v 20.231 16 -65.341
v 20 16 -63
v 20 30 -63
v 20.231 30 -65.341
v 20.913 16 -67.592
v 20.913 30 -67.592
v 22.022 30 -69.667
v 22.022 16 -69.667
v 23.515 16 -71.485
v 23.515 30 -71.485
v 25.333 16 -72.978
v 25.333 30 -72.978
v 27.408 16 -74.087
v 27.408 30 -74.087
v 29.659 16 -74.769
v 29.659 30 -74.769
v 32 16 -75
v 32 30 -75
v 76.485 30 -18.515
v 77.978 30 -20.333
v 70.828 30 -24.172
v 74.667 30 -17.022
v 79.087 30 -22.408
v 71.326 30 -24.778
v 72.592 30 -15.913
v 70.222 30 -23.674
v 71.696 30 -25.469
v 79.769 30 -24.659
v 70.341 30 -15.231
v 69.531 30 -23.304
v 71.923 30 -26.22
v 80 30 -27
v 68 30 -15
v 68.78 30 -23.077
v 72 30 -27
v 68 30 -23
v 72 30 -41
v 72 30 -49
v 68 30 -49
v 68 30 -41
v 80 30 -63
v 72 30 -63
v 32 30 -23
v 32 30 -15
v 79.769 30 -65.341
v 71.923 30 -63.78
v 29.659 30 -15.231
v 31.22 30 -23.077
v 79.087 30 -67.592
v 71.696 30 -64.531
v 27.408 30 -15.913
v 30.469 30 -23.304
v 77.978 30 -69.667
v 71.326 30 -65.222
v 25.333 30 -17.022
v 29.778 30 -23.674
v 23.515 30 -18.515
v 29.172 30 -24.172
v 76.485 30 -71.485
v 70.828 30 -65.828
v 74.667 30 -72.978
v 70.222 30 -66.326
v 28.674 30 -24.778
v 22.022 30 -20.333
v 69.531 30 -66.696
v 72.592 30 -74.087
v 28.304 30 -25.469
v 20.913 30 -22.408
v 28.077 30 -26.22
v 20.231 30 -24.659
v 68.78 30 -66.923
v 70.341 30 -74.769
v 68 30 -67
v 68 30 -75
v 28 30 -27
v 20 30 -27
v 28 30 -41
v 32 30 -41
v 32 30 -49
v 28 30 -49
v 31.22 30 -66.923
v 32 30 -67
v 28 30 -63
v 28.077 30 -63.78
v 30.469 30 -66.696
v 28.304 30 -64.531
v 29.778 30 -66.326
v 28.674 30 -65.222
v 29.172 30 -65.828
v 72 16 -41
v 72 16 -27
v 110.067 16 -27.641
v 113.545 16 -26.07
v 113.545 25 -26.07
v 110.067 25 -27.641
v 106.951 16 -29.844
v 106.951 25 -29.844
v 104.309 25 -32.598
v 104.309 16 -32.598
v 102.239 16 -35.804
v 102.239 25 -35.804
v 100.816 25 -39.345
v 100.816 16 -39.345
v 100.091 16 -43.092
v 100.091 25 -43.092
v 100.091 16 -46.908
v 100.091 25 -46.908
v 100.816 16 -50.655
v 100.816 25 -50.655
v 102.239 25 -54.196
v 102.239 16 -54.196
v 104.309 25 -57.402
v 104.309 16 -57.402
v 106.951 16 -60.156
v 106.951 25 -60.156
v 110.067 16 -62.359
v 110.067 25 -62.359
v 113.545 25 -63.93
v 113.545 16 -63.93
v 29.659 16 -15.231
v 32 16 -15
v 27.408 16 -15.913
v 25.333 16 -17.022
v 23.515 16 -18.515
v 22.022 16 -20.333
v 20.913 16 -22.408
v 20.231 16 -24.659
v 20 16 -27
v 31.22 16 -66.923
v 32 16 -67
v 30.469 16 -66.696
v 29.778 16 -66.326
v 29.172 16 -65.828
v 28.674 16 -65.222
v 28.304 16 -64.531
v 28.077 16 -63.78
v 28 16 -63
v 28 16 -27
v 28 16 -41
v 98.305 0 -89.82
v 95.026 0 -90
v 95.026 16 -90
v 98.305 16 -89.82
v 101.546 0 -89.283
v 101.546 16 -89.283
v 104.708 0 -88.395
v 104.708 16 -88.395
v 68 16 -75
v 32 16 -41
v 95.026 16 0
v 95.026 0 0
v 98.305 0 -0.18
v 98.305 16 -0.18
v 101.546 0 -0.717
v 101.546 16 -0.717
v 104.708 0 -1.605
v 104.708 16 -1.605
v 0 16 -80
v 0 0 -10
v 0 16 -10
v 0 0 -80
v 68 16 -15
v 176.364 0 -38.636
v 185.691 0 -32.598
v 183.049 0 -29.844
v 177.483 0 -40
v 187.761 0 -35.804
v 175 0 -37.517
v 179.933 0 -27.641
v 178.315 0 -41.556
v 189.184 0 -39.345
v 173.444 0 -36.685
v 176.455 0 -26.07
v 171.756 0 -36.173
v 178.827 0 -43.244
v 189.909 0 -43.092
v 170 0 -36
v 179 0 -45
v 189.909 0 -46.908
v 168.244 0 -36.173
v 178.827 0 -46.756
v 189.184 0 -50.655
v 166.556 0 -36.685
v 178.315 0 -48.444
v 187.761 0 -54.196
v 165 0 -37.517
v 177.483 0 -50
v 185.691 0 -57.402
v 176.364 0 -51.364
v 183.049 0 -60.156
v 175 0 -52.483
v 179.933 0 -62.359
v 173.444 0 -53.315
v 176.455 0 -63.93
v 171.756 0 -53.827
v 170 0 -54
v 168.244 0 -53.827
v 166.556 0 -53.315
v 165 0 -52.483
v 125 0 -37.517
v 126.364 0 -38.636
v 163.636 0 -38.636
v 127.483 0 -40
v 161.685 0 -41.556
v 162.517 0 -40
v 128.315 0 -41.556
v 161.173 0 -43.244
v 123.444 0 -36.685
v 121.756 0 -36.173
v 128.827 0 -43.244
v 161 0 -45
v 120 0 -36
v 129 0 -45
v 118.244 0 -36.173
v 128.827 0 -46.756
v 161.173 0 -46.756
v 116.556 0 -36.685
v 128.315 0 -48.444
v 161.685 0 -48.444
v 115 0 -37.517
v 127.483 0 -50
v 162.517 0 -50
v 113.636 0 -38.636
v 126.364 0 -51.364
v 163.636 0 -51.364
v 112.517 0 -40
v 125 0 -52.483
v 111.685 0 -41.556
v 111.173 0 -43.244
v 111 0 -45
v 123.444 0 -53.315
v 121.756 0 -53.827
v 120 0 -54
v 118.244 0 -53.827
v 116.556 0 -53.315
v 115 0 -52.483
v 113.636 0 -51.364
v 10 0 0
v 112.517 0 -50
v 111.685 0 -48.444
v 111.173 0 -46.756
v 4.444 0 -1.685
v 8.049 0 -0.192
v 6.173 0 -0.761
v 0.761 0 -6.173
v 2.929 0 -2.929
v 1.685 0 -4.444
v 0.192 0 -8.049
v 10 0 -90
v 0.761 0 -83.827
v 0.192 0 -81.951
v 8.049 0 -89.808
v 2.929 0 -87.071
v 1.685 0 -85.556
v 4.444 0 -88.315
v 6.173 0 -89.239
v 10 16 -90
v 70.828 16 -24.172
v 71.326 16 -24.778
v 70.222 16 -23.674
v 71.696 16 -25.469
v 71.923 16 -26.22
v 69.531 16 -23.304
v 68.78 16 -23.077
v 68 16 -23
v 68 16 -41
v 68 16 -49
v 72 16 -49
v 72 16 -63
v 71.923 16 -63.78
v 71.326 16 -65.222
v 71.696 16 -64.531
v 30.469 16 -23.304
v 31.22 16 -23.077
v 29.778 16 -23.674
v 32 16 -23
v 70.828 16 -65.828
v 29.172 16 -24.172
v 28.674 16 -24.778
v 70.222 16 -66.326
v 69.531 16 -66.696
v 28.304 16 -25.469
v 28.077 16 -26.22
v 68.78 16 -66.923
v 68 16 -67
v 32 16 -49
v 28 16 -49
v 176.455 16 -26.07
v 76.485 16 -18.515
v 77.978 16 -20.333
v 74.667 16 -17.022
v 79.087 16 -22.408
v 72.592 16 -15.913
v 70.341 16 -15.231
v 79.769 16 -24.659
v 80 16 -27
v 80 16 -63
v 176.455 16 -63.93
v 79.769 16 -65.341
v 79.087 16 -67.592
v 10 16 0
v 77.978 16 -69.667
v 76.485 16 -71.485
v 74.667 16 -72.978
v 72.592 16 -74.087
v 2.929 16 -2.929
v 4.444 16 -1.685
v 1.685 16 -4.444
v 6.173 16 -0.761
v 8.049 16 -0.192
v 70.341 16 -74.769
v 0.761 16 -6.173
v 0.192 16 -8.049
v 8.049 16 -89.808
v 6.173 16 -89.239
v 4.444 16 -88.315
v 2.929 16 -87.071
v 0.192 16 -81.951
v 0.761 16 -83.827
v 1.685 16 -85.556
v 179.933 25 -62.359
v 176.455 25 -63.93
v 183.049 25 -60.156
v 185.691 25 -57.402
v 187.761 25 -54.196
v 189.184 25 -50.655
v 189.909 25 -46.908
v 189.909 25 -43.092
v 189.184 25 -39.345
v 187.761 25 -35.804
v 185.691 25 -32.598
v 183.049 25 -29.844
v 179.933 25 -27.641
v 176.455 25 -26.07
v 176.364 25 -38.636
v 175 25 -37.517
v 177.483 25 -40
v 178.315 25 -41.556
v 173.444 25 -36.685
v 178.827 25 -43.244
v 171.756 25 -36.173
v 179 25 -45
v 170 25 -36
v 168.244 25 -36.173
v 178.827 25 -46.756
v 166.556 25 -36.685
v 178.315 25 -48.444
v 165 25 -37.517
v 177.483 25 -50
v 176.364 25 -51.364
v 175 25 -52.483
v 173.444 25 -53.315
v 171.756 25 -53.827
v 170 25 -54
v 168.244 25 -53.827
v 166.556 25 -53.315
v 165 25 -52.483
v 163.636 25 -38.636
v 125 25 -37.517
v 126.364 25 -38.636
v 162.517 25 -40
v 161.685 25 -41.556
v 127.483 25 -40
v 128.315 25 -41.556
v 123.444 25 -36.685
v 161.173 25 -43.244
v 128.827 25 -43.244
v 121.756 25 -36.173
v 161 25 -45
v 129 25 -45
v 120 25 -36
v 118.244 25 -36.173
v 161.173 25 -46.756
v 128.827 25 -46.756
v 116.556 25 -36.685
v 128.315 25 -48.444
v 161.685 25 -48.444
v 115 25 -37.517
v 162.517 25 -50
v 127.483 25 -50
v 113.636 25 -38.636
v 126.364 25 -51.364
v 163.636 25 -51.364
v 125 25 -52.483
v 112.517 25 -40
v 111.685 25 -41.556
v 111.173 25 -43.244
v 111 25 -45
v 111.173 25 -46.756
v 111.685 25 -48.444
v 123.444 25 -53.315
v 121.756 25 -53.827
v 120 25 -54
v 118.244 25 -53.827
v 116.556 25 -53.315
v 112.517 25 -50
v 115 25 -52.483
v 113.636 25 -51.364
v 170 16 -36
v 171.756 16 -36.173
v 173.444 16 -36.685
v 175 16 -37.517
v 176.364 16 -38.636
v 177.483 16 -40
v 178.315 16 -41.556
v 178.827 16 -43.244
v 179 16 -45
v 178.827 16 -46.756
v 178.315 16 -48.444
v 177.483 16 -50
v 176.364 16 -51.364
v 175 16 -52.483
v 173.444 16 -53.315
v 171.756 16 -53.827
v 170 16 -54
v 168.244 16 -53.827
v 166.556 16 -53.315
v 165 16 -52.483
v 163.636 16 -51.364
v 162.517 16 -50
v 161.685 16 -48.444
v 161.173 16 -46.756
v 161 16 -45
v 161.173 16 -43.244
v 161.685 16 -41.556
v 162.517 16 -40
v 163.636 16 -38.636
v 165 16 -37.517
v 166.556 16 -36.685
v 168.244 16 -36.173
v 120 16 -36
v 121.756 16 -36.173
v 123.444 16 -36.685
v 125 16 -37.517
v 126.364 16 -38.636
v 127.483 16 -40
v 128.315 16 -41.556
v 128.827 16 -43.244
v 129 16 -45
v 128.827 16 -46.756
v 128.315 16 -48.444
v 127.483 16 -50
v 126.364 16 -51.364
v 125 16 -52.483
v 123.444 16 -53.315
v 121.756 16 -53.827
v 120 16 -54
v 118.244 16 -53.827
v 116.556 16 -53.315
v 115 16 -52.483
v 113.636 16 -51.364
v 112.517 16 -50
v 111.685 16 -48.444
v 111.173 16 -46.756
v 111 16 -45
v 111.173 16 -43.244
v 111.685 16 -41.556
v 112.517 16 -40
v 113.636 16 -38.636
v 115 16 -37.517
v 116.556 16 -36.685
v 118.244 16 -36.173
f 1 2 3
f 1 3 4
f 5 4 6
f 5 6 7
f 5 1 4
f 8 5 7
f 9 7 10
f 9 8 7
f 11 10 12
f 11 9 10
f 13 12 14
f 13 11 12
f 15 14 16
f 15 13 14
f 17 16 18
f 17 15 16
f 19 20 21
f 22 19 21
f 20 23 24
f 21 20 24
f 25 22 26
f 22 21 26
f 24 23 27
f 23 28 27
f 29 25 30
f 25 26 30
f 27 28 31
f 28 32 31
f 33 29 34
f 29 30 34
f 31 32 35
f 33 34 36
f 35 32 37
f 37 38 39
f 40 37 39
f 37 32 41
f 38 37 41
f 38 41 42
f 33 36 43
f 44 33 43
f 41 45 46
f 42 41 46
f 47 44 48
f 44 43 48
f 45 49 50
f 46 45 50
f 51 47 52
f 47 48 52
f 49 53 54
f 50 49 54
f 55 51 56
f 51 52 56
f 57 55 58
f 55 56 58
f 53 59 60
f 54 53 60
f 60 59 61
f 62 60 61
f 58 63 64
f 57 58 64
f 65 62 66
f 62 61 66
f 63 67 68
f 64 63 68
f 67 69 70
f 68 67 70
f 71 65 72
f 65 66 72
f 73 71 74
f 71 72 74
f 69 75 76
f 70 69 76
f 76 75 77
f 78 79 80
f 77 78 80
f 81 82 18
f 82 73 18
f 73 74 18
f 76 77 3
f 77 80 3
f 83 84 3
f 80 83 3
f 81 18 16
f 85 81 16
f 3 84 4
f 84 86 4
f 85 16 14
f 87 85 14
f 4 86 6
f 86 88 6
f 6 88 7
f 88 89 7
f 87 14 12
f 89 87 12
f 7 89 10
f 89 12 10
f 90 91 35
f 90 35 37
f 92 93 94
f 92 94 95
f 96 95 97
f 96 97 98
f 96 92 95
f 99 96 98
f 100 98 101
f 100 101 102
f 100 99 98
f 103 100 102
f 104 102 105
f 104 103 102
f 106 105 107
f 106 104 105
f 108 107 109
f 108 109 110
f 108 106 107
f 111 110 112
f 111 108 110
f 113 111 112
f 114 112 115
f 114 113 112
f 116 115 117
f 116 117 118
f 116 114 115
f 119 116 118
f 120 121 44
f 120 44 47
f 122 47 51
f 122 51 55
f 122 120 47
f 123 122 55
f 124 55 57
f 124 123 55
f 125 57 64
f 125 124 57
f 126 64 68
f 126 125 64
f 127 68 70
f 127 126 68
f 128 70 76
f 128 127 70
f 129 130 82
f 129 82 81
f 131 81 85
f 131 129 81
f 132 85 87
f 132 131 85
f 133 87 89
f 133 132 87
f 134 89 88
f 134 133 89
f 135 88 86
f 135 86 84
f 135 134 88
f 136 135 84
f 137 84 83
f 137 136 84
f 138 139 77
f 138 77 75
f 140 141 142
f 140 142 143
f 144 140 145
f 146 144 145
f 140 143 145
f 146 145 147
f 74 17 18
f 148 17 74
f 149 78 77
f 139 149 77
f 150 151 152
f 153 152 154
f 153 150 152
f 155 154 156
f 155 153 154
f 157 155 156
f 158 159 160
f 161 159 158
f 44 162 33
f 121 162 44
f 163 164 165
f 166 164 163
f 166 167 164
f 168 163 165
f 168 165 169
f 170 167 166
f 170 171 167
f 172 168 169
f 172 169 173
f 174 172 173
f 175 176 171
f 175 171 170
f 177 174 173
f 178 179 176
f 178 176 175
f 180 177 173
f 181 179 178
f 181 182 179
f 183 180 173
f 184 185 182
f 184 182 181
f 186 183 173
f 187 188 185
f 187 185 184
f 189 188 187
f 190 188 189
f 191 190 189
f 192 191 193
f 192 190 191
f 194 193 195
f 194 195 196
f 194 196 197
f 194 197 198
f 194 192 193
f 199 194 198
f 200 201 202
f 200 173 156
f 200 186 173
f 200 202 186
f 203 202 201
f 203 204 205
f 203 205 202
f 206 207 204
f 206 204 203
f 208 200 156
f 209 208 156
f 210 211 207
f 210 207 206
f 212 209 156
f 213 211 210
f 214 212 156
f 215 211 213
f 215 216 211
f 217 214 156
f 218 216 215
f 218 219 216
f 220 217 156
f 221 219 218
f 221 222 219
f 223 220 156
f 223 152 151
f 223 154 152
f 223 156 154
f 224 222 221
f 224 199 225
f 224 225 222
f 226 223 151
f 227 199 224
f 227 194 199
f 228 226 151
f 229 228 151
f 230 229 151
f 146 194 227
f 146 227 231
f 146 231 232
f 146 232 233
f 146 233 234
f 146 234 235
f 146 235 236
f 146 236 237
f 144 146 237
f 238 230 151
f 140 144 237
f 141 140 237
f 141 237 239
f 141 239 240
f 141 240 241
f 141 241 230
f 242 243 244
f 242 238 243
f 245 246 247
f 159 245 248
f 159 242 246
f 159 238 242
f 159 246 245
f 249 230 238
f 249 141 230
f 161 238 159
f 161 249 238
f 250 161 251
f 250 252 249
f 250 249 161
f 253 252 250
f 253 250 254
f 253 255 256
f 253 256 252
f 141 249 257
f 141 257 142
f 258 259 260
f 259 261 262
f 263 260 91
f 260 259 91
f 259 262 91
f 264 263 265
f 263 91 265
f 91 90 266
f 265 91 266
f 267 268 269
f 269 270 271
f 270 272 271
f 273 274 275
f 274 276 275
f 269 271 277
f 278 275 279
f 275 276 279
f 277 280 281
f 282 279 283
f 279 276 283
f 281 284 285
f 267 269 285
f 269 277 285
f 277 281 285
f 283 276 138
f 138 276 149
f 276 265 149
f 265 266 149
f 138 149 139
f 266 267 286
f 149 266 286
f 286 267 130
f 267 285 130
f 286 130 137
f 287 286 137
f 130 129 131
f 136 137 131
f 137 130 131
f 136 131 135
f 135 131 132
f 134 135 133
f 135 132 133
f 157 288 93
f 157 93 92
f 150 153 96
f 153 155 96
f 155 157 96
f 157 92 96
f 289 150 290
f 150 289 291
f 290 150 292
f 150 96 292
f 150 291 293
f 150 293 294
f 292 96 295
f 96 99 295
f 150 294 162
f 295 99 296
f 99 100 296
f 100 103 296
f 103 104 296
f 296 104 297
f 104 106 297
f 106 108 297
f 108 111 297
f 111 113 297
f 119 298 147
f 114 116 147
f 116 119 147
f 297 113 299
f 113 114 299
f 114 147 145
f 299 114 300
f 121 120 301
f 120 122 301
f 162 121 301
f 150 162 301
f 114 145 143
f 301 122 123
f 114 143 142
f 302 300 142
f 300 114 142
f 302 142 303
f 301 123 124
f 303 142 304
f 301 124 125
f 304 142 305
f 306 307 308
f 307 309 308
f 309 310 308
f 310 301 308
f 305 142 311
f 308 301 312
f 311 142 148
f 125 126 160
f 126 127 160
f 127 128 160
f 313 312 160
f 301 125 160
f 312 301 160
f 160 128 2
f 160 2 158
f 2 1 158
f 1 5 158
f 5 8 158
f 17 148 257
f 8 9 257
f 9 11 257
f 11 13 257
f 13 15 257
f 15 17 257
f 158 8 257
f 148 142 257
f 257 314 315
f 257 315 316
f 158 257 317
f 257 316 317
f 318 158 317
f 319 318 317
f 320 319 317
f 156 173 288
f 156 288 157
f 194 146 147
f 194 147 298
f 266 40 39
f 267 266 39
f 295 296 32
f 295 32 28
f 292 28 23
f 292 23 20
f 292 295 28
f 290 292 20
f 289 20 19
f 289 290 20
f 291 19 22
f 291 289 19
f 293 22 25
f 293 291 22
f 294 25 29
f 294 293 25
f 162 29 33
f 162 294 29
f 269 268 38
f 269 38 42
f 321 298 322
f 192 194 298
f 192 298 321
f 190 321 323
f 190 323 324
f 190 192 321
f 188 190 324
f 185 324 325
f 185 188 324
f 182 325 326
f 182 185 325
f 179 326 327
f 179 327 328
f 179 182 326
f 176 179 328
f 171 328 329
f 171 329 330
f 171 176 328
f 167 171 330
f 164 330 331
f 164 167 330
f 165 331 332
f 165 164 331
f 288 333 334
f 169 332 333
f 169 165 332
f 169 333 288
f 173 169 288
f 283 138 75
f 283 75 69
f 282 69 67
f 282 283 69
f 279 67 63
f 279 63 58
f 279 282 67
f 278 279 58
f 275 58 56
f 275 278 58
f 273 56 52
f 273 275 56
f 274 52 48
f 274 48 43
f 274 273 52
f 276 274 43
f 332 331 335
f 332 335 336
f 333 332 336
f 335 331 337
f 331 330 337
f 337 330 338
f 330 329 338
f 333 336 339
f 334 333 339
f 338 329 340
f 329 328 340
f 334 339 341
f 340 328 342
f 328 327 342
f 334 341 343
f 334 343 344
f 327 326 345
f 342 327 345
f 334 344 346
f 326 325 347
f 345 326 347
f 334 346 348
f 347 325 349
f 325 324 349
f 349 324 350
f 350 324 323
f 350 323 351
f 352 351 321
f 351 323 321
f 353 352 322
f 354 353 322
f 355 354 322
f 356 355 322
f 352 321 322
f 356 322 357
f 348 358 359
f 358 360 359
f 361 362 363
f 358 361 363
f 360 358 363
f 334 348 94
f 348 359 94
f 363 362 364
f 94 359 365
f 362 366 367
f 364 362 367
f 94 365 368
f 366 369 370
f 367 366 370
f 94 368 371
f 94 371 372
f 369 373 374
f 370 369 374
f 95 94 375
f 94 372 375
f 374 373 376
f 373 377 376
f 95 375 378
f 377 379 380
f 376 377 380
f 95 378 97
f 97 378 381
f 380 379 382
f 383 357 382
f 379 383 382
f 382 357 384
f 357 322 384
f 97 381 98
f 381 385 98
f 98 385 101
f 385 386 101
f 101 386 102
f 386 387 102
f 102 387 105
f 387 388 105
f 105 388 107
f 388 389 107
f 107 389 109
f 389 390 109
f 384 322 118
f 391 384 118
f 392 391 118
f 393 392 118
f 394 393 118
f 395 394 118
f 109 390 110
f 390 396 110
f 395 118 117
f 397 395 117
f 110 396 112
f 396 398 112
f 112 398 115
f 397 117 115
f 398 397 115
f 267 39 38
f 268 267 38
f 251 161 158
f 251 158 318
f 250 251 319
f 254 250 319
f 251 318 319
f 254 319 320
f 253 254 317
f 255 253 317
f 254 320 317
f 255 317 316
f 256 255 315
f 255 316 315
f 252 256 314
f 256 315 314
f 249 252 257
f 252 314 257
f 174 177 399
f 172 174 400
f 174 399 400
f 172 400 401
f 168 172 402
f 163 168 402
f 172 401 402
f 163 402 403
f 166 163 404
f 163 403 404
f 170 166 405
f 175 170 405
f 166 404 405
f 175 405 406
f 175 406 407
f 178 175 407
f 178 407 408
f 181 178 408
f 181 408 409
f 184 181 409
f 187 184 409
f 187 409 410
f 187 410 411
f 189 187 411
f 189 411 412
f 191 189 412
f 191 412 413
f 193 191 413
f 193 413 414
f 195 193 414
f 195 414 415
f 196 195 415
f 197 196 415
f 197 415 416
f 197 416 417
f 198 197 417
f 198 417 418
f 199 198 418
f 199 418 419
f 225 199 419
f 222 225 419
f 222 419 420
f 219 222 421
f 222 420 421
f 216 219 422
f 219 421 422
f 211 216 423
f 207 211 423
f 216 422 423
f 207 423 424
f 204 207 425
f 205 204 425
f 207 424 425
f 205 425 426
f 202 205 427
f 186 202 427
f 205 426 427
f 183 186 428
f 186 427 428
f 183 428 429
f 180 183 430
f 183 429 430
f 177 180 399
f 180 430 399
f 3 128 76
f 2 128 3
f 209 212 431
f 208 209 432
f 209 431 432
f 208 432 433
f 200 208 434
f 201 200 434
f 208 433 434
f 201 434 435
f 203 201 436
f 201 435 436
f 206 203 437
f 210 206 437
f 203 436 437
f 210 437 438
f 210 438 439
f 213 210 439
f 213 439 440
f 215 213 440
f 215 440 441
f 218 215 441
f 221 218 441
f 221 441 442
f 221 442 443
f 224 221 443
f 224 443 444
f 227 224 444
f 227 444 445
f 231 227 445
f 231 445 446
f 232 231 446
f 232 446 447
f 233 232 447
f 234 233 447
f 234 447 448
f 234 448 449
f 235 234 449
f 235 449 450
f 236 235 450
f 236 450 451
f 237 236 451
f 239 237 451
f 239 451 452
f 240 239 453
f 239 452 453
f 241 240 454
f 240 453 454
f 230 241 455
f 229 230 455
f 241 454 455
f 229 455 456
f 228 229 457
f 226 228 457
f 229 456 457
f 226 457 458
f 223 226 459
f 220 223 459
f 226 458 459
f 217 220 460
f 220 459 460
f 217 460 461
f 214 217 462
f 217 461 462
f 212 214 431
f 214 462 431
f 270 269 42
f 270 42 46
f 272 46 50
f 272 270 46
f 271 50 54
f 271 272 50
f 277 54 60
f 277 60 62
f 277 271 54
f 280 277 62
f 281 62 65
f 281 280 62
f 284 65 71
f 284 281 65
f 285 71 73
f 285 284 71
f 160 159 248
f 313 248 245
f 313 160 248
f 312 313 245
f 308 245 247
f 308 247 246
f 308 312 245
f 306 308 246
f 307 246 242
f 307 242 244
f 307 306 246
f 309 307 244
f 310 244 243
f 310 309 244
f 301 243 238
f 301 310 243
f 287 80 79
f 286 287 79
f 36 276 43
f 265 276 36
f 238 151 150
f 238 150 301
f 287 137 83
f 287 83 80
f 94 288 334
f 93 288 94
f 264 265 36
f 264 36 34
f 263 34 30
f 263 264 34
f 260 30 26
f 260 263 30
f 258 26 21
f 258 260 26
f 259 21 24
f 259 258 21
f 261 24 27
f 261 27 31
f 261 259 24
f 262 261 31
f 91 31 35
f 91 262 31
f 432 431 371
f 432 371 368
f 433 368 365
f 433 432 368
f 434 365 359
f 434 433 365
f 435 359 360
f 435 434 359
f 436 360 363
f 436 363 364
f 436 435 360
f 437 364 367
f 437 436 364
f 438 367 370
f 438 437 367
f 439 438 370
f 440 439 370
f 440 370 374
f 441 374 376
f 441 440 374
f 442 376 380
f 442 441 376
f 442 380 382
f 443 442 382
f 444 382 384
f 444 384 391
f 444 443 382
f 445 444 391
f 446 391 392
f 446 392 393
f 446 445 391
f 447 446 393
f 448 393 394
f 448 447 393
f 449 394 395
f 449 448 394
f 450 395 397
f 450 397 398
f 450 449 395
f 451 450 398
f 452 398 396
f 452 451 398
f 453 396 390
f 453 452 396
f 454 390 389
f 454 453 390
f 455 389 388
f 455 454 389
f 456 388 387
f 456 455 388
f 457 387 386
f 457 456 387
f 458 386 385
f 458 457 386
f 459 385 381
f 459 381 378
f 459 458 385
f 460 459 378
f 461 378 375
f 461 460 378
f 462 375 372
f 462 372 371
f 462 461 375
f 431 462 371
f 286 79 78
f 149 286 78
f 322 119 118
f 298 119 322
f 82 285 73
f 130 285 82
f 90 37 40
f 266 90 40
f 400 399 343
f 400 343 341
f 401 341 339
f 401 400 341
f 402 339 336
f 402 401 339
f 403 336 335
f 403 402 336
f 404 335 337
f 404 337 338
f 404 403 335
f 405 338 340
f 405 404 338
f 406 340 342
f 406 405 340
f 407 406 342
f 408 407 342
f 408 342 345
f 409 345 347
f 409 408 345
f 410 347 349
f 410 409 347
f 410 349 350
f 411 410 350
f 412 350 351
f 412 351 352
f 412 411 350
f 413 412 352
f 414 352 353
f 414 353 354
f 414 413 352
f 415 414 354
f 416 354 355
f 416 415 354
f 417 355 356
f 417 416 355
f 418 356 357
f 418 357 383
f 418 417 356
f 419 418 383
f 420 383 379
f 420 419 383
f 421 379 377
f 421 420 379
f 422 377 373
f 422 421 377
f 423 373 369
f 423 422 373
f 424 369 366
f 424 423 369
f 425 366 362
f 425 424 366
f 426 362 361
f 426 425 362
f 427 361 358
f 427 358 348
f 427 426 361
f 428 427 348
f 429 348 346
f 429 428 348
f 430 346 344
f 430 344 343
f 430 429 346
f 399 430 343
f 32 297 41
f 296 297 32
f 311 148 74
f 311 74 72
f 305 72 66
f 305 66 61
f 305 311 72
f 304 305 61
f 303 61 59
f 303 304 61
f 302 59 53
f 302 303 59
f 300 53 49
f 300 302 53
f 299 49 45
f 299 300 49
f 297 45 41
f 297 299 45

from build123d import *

# Parameters (mm, degrees)
EXTRUDE_1_DEPTH     = 16
FILLET_1_R          = 10
FILLET_2_R          = 30
EXTRUDE_2_DEPTH     = 14
SKETCH_5_R          = 9
EXTRUDE_3_DEPTH     = 9
SKETCH_7_R          = 9
CUT_EXTRUDE_2_DEPTH = 212.719153597


with BuildPart() as part:
    # 草图3 → 凸台-拉伸1 (new body)
    with BuildSketch(Plane(origin=(0, 0, 0), x_dir=(1, 0, 0), z_dir=(0, 1, 0))):
        with BuildLine():
            Line((0, 0), (0, 90))
            Line((0, 90), (100, 90))
            Line((100, 90), (176.45483392, 63.929741653))
            ThreePointArc((176.45483392, 63.929741653), (190, 45), (176.45483392, 26.070258347))
            Line((176.45483392, 26.070258347), (100, 0))
            Line((100, 0), (0, 0))
        make_face()
    extrude(amount=EXTRUDE_1_DEPTH)

    # 圆角1
    fillet_1_edges = [part.edges().sort_by_distance(p)[0] for p in [
        (0, 8, -90),
        (0, 8, 0),
    ]]
    fillet(fillet_1_edges, radius=FILLET_1_R)

    # 圆角2
    fillet_2_edges = [part.edges().sort_by_distance(p)[0] for p in [
        (100, 8, -90),
        (100, 8, 0),
    ]]
    fillet(fillet_2_edges, radius=FILLET_2_R)

    # 草图4 → 凸台-拉伸2 (add)
    with BuildSketch(Plane(origin=(0, 16, 0), x_dir=(1, 0, 0), z_dir=(0, 1, 0))):
        with BuildLine():
            Line((68, 75), (32, 75))
            ThreePointArc((32, 75), (23.514718626, 71.485281374), (20, 63))
            Line((20, 63), (20, 27))
            ThreePointArc((20, 27), (23.514718626, 18.514718626), (32, 15))
            Line((32, 15), (68, 15))
            ThreePointArc((68, 15), (76.485281374, 18.514718626), (80, 27))
            Line((80, 27), (80, 63))
            ThreePointArc((80, 63), (76.485281374, 71.485281374), (68, 75))
        make_face()
        with BuildLine():
            Line((28, 49), (28, 63))
            ThreePointArc((28, 63), (29.171572875, 65.828427125), (32, 67))
            Line((32, 67), (50, 67))
            Line((50, 67), (68, 67))
            ThreePointArc((68, 67), (70.828427125, 65.828427125), (72, 63))
            Line((72, 63), (72, 49))
            Line((72, 49), (68, 49))
            Line((68, 49), (68, 45))
            Line((68, 45), (68, 41))
            Line((68, 41), (72, 41))
            Line((72, 41), (72, 27))
            ThreePointArc((72, 27), (70.828427125, 24.171572875), (68, 23))
            Line((68, 23), (32, 23))
            ThreePointArc((32, 23), (29.171572875, 24.171572875), (28, 27))
            Line((28, 27), (28, 41))
            Line((28, 41), (32, 41))
            Line((32, 41), (32, 45))
            Line((32, 45), (32, 49))
            Line((32, 49), (28, 49))
        make_face(mode=Mode.SUBTRACT)
    extrude(amount=EXTRUDE_2_DEPTH)

    # 草图5 → 凸台-拉伸3 (add)
    with BuildSketch(Plane(origin=(0, 16, 0), x_dir=(1, 0, 0), z_dir=(0, 1, 0))):
        with BuildLine():
            Line((176.45483392, 63.929741653), (113.54516608, 63.929741653))
            ThreePointArc((113.54516608, 63.929741653), (100, 45), (113.54516608, 26.070258347))
            Line((113.54516608, 26.070258347), (176.45483392, 26.070258347))
            ThreePointArc((176.45483392, 26.070258347), (190, 45), (176.45483392, 63.929741653))
        make_face()
        with Locations((120, 45)):
            Circle(SKETCH_5_R, mode=Mode.SUBTRACT)
        with Locations((170, 45)):
            Circle(SKETCH_5_R, mode=Mode.SUBTRACT)
    extrude(amount=EXTRUDE_3_DEPTH)

    # 草图7 → 切除-拉伸2 (cut, through all)
    with BuildSketch(Plane(origin=(0, 25, 0), x_dir=(1, 0, 0), z_dir=(0, 1, 0))):
        with Locations((120, 45)):
            Circle(SKETCH_7_R)
        with Locations((170, 45)):
            Circle(SKETCH_7_R)
    extrude(amount=-CUT_EXTRUDE_2_DEPTH, mode=Mode.SUBTRACT)


solid = part.part
